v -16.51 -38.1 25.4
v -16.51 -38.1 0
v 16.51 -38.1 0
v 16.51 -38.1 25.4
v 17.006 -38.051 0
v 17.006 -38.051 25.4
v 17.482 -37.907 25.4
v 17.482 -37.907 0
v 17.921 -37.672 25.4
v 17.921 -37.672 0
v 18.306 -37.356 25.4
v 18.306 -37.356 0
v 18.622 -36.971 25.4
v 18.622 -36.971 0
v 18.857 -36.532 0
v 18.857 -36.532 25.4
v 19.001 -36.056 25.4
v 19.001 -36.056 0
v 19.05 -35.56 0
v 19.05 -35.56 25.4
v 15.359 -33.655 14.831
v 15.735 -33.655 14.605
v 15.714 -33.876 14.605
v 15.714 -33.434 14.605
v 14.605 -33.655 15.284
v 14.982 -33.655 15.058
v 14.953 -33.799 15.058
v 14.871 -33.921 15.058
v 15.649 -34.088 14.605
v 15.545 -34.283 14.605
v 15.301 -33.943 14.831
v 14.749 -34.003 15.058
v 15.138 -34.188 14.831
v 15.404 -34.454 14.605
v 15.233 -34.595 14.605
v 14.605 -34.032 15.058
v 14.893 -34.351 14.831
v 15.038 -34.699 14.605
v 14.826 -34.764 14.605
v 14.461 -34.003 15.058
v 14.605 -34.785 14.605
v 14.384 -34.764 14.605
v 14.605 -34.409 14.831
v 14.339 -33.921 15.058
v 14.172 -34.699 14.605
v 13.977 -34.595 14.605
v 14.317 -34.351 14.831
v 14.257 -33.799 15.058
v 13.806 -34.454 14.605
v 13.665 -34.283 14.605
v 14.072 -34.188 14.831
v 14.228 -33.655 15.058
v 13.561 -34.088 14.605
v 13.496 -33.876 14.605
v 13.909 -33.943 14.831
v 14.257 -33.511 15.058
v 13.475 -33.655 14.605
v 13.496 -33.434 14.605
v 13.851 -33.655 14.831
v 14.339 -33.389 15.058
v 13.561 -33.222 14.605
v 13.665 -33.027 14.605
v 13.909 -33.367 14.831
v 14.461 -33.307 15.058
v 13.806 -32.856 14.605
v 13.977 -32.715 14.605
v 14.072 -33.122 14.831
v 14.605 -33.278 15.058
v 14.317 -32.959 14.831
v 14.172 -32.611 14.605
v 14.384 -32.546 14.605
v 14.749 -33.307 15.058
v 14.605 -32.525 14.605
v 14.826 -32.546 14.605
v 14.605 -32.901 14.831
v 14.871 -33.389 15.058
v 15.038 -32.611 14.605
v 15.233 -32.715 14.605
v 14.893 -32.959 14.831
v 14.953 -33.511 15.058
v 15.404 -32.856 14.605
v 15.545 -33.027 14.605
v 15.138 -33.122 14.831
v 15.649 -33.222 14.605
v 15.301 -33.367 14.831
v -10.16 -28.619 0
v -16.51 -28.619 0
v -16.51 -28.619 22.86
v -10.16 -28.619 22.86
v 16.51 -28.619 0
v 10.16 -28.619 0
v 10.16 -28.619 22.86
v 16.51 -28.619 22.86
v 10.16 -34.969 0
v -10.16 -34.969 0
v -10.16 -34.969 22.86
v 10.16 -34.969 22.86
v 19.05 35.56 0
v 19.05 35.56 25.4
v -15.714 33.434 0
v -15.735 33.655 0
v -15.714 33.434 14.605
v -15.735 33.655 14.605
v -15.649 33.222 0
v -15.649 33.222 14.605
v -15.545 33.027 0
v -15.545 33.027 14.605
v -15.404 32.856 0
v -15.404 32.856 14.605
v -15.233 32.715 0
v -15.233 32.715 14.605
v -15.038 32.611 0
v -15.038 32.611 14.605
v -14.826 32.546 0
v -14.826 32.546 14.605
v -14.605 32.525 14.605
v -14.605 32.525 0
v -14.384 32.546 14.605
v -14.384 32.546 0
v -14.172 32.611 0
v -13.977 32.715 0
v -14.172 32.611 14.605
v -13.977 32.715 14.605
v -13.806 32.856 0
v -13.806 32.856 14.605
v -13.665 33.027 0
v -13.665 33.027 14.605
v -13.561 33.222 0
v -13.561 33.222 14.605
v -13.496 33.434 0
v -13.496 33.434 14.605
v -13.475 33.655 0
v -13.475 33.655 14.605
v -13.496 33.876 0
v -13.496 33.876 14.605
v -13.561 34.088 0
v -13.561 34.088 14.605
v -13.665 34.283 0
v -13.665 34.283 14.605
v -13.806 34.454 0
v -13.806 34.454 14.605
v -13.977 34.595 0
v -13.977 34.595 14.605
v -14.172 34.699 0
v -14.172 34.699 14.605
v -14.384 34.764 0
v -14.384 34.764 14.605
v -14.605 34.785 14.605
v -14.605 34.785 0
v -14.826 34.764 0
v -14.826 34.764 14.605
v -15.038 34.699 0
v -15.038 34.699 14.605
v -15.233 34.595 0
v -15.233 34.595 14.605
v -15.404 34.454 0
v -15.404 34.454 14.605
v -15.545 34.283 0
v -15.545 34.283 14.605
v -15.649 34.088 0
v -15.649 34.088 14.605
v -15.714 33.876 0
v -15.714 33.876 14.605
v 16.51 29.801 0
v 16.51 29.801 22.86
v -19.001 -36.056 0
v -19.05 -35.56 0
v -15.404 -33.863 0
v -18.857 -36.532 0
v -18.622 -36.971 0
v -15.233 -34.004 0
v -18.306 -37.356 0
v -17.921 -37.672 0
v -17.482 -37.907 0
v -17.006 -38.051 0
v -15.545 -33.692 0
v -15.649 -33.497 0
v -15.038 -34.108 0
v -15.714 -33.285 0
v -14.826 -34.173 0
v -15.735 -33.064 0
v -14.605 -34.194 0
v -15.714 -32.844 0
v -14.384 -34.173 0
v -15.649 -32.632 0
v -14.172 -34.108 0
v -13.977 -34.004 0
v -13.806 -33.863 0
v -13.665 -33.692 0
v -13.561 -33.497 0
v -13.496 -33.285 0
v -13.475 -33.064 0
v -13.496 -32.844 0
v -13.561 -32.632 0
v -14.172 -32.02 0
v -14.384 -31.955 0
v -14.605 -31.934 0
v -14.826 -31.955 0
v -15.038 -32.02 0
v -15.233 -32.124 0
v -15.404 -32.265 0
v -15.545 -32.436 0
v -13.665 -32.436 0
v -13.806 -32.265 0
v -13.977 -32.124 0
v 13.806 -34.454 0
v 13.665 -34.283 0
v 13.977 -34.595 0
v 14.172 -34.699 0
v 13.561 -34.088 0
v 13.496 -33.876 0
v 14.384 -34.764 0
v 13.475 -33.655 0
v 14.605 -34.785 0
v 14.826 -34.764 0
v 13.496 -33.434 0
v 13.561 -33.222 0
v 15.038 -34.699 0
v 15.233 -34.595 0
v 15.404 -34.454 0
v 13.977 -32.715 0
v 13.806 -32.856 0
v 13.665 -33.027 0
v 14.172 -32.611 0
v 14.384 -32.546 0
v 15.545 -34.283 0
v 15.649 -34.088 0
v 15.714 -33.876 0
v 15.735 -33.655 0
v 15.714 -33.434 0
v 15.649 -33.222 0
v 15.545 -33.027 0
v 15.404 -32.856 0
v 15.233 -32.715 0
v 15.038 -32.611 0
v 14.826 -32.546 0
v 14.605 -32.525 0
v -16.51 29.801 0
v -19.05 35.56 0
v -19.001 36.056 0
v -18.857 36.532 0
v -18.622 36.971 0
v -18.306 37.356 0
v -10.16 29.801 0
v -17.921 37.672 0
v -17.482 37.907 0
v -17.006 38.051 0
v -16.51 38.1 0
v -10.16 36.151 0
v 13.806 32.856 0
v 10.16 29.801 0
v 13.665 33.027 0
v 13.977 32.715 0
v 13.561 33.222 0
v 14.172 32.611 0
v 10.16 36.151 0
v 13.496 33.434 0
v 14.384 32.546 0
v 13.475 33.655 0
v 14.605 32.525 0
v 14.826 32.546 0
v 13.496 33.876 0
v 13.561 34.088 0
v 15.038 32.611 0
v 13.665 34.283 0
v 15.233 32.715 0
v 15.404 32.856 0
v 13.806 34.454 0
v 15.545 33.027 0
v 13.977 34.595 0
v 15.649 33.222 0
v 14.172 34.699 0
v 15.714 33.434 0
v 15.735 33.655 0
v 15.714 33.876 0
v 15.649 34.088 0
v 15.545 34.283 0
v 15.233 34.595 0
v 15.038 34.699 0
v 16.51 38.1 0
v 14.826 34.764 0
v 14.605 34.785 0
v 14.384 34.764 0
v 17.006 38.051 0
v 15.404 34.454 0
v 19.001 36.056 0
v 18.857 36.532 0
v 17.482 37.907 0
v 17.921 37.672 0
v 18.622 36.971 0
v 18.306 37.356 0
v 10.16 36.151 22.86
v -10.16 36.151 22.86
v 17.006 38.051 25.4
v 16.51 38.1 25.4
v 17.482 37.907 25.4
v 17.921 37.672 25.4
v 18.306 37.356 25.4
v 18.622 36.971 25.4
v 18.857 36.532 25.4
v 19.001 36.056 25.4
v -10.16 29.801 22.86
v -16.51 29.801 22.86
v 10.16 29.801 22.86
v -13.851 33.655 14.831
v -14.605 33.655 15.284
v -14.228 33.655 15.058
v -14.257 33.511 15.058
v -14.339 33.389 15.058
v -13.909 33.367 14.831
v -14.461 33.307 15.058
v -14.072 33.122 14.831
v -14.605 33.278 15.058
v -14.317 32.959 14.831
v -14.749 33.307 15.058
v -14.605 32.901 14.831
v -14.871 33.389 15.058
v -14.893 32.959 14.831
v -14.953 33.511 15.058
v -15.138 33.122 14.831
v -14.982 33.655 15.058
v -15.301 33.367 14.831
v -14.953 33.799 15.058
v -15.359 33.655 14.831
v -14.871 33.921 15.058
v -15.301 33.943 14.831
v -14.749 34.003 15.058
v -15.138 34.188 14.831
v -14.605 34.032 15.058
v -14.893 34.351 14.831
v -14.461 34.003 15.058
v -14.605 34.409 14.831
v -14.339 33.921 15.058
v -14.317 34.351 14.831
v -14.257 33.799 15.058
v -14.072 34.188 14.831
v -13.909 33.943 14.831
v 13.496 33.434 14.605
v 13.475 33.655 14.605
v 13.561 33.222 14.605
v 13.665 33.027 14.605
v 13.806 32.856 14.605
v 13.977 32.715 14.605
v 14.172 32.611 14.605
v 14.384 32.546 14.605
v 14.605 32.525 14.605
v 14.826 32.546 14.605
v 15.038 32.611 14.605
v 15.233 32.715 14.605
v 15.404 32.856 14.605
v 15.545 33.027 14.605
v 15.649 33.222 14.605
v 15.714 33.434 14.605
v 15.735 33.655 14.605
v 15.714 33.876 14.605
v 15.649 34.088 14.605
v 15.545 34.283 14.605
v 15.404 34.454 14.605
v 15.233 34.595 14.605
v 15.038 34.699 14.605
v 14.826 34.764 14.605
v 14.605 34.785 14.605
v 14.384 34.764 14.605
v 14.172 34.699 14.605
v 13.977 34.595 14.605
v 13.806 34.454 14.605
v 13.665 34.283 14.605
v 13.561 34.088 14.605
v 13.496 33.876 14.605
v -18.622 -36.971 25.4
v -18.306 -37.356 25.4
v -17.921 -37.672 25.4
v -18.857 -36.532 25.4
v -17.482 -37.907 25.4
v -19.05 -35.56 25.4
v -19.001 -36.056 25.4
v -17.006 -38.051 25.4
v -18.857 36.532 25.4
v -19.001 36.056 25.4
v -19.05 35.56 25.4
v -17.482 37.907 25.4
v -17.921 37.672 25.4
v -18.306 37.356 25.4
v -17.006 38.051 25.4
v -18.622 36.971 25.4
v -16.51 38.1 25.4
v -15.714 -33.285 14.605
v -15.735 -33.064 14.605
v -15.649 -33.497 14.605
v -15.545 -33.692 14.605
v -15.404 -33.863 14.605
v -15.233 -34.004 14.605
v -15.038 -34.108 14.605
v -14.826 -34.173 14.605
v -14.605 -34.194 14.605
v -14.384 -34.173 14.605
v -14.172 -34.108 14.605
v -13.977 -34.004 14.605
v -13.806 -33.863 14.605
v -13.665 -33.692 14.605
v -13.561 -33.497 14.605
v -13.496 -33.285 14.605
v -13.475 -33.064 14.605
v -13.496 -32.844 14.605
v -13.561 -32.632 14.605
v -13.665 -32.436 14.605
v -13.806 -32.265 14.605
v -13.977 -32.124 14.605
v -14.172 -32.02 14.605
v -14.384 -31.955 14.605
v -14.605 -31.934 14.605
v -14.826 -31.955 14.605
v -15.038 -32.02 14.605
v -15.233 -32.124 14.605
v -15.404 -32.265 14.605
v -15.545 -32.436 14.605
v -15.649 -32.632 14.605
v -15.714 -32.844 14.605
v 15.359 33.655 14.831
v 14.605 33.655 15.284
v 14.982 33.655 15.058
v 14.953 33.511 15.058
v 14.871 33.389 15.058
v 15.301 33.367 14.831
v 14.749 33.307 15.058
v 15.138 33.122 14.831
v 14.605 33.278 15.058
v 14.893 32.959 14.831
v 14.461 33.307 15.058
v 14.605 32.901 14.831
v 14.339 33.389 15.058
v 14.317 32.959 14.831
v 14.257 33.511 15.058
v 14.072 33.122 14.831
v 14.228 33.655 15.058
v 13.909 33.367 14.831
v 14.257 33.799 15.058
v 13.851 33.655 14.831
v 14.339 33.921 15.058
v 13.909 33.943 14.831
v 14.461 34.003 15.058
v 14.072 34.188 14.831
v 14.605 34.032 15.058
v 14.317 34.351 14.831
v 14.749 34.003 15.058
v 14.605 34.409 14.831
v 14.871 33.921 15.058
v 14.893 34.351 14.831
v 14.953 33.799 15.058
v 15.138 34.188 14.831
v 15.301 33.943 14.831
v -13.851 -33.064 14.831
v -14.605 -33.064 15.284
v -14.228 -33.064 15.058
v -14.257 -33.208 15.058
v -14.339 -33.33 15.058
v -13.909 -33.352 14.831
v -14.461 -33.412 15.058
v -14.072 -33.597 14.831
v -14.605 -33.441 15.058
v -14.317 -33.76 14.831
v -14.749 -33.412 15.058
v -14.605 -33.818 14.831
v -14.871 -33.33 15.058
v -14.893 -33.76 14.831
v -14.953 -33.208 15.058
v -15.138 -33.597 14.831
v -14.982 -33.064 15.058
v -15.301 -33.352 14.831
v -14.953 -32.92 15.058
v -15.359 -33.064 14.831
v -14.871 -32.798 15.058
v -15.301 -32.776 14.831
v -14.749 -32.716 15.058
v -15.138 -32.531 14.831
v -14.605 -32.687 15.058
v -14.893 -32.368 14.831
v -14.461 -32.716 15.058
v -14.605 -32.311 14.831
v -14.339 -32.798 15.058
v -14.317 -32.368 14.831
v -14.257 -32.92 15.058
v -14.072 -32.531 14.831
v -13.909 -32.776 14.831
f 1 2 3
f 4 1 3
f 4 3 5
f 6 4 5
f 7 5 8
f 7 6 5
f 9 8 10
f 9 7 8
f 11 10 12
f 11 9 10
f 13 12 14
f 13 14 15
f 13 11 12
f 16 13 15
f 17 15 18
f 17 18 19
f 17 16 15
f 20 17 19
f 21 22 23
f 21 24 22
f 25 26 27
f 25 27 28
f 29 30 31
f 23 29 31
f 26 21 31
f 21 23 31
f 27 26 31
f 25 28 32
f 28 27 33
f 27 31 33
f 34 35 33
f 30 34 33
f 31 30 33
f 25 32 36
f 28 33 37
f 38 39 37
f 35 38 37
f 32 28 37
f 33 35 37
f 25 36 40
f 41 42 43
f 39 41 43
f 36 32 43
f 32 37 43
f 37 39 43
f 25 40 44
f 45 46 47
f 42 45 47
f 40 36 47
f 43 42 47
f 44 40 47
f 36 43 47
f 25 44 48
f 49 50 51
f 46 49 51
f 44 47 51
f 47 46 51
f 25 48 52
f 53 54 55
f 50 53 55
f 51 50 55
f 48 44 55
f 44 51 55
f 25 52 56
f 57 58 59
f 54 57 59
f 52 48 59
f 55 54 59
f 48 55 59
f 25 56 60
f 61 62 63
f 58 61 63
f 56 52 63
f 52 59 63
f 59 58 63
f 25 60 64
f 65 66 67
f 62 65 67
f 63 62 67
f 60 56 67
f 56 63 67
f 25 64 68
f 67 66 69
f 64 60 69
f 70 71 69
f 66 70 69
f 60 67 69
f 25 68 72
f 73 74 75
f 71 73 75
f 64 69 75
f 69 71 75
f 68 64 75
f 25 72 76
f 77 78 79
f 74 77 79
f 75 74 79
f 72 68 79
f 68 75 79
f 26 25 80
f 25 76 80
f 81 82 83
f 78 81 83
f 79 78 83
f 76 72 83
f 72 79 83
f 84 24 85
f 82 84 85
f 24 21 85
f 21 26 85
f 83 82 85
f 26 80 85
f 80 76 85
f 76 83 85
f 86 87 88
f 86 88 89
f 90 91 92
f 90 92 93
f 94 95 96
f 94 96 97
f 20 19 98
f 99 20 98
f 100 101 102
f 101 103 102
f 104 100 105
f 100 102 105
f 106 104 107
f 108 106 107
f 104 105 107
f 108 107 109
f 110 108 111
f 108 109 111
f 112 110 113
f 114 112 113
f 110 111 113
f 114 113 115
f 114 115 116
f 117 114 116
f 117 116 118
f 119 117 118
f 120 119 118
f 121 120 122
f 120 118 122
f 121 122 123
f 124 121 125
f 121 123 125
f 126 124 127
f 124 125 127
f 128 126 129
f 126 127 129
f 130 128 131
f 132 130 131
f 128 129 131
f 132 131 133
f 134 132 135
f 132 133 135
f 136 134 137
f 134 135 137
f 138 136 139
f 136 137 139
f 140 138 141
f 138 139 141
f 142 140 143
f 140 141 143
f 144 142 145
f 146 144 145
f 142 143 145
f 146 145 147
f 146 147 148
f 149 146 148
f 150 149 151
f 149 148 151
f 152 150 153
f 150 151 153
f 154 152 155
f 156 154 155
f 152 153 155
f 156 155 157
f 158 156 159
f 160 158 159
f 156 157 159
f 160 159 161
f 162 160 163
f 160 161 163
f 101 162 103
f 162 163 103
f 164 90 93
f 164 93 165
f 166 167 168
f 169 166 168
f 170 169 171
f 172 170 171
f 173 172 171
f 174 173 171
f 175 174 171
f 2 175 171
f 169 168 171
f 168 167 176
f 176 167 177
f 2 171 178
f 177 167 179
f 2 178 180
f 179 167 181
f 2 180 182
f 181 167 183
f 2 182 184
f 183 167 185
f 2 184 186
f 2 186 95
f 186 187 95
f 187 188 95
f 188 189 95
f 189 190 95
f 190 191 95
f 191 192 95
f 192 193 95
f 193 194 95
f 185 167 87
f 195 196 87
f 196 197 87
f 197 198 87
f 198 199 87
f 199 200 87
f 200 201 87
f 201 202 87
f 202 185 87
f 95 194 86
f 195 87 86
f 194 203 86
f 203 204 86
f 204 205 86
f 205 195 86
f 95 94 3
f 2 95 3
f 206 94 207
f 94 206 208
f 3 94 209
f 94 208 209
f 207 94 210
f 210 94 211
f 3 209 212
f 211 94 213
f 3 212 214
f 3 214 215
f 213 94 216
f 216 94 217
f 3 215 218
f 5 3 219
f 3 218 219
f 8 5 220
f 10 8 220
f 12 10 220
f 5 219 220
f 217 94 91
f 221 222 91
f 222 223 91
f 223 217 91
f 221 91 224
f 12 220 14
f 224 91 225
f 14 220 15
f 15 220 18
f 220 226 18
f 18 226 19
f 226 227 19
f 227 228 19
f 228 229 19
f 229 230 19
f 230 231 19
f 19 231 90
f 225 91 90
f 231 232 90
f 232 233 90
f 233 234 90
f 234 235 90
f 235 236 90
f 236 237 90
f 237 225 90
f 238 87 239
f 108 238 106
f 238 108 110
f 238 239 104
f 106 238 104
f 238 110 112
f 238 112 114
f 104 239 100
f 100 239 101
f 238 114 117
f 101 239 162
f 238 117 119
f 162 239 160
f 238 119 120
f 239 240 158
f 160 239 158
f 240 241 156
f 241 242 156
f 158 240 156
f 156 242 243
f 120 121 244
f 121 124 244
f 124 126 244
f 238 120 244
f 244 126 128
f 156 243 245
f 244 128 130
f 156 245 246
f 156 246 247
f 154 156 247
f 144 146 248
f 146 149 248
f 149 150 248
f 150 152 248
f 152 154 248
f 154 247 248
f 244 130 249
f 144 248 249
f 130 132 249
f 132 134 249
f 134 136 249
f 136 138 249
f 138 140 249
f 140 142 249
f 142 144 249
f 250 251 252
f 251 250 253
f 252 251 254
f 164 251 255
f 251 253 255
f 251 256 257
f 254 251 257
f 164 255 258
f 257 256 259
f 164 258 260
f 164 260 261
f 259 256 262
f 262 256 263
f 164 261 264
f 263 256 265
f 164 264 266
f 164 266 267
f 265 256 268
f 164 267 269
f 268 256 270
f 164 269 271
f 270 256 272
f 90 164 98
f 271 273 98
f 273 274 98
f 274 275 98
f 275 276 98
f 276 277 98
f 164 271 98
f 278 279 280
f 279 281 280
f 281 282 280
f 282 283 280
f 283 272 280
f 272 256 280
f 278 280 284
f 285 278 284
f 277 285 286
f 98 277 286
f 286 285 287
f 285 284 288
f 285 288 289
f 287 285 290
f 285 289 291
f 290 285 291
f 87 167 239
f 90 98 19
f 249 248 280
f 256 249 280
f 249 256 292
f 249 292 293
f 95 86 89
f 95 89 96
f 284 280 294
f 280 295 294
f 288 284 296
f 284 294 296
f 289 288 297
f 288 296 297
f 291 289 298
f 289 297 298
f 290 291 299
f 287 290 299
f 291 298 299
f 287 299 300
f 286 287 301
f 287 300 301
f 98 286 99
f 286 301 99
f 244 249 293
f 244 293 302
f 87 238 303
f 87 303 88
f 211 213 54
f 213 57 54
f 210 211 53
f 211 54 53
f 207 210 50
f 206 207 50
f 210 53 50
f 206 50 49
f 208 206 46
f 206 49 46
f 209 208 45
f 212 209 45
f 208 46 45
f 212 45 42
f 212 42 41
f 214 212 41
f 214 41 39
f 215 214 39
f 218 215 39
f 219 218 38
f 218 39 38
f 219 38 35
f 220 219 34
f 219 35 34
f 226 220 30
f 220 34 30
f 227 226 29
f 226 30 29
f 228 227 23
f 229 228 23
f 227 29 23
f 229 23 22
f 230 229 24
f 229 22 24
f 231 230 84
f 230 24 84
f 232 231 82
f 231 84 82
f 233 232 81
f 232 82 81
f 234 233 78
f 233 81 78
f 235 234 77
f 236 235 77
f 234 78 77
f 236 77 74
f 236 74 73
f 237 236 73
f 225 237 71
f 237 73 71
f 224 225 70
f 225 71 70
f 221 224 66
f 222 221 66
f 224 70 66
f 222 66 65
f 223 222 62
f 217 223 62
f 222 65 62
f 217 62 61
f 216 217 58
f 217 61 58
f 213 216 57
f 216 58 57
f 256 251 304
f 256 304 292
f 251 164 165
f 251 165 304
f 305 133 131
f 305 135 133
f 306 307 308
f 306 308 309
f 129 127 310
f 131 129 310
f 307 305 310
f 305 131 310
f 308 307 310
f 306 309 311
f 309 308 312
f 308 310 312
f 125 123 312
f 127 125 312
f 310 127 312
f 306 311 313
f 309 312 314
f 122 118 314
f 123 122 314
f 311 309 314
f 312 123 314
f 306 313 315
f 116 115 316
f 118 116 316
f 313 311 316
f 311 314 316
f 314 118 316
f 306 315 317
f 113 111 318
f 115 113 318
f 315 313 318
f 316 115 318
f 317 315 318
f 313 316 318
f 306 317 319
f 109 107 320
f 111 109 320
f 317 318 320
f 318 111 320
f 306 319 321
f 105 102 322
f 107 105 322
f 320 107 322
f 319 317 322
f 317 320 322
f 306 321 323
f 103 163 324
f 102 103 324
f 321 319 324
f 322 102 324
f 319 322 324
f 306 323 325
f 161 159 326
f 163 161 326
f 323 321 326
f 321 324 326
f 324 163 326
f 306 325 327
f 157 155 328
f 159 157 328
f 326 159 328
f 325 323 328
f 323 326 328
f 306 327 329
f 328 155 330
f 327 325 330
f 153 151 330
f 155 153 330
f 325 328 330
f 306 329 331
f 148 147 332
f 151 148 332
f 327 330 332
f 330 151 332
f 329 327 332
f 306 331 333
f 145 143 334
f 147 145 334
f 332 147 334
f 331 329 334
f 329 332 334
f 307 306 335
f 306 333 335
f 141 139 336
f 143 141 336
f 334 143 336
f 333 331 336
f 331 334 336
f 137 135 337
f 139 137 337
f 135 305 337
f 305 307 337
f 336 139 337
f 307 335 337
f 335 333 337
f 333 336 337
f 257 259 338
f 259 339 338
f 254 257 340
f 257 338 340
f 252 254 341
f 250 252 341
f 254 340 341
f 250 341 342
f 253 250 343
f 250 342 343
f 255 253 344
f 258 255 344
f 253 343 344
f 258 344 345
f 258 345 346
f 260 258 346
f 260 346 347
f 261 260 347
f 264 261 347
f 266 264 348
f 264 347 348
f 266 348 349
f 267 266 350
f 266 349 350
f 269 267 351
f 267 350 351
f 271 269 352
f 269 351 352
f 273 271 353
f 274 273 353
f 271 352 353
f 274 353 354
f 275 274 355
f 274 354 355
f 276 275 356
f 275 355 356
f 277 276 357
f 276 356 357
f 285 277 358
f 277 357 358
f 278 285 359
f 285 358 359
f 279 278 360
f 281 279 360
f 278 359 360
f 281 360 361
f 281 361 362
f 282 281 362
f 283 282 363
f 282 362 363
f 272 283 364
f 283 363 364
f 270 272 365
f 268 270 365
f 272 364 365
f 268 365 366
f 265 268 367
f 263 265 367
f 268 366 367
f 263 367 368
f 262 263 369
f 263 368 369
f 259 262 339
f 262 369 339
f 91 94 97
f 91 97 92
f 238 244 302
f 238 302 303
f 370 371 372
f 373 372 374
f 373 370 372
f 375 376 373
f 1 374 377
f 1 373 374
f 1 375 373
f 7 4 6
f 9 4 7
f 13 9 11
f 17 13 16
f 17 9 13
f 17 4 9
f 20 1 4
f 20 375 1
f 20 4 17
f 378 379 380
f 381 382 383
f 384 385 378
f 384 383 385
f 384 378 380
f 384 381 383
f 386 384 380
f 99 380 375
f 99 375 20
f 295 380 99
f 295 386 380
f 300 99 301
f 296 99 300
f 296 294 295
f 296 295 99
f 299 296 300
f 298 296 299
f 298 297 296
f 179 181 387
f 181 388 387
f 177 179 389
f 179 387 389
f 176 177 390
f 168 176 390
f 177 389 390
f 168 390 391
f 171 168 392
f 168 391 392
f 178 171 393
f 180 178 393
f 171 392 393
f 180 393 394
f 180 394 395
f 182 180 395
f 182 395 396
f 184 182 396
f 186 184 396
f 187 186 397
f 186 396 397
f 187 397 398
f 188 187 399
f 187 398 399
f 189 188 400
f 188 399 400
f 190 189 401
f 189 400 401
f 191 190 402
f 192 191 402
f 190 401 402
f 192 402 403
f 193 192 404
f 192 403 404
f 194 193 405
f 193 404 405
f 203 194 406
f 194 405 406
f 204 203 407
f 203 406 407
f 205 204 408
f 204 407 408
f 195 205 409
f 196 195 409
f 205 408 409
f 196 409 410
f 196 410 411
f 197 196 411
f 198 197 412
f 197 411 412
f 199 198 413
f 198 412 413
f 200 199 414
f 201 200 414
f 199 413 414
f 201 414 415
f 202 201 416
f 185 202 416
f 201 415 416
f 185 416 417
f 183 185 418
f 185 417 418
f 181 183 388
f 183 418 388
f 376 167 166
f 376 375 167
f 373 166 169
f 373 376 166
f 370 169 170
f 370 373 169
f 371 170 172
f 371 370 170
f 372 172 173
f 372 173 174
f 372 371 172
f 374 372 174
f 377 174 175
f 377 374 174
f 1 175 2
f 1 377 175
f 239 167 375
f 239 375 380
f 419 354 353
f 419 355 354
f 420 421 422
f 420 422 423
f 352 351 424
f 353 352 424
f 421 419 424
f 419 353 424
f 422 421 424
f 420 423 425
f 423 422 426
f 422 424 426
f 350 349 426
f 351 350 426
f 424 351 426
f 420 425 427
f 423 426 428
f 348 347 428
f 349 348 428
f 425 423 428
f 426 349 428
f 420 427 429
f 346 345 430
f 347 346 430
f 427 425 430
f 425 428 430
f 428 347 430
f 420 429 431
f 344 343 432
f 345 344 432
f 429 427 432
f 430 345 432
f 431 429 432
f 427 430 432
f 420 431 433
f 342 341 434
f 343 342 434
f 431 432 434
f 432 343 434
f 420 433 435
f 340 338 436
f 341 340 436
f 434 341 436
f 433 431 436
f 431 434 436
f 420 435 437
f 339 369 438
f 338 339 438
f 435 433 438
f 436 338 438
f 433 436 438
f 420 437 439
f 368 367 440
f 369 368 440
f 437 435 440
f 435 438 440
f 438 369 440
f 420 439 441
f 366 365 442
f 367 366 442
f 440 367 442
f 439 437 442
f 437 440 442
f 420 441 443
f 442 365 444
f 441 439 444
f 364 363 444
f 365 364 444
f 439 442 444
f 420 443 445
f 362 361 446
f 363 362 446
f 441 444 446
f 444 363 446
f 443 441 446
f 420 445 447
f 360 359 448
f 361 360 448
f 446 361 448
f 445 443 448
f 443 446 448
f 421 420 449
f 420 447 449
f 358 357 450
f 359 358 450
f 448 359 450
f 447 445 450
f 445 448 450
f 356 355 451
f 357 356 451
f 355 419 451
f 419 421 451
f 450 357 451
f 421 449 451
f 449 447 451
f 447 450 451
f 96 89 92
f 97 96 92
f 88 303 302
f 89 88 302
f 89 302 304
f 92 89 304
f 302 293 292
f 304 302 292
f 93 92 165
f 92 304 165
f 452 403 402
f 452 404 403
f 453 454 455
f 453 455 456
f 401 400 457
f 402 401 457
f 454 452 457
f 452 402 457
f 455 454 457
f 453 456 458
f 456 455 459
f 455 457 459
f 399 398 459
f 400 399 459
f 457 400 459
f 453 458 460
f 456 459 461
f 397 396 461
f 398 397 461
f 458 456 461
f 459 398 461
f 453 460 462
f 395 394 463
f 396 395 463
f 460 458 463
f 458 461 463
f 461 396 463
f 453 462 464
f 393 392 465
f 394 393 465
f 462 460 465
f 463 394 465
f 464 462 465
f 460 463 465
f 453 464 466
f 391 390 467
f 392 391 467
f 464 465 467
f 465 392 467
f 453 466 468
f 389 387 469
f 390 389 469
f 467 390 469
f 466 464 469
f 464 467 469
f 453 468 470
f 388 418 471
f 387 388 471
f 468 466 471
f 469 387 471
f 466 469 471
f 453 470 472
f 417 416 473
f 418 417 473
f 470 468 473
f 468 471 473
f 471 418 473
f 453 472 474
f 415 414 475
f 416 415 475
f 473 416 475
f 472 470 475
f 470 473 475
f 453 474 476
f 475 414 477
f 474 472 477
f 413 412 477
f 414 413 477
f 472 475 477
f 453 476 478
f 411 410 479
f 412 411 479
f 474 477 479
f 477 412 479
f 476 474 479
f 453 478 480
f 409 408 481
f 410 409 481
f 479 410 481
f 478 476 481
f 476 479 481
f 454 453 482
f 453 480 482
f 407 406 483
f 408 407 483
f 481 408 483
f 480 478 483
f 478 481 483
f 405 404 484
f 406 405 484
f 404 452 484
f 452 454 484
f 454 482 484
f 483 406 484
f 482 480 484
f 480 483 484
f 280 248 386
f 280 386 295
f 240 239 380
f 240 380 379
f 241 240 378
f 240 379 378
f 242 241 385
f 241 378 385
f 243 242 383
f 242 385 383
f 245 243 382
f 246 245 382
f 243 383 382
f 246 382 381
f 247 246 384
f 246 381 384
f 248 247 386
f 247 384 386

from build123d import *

# Parameters (mm, degrees)
F0_W     = 38.1
F0_H     = 76.2
F1_DEPTH = 25.4
F3_DEPTH = 22.86
F4_D     = 2.2606
F4_DEPTH = 14.605
F4_TIP   = 0.6791527577
F5_R     = 2.54


with BuildPart() as f1:
    # F0 (on Top) → F1 (new body)
    with BuildSketch(Plane.XY):
        Rectangle(F0_W, F0_H)
    extrude(amount=F1_DEPTH)

    # F2 (on Top) → F3 (cut)
    with BuildSketch(Plane.XY):
        Polygon((10.16, 36.1509363616), (-10.16, 36.1509363616), (-10.16, 29.8009363616), (-16.51, 29.8009363616), (-16.51, -28.6190636384), (-10.16, -28.6190636384), (-10.16, -34.9690636384), (10.16, -34.9690636384), (10.16, -28.6190636384), (16.51, -28.6190636384), (16.51, 29.8009363616), (10.16, 29.8009363616), align=None)
    extrude(amount=F3_DEPTH, mode=Mode.SUBTRACT)

    # F4
    with Locations(Plane(origin=(0, 0, 0), x_dir=(1, 0, 0), z_dir=(0, 0, -1))):
        with Locations((-14.605, -33.655), (14.605, -33.655), (14.605, 33.655), (-14.605, 33.0640636384)):
            Hole(F4_D / 2, depth=F4_DEPTH)
            with Locations((0, 0, -(F4_DEPTH + F4_TIP / 2))):  # 118° drill point
                Cone(0, F4_D / 2, F4_TIP, mode=Mode.SUBTRACT)

    # F5
    f5_edges = [f1.edges().sort_by_distance(p)[0] for p in [
        (19.05, -38.1, 12.7),
        (-19.05, -38.1, 12.7),
        (-19.05, 38.1, 12.7),
        (19.05, 38.1, 12.7),
    ]]
    fillet(f5_edges, radius=F5_R)


solid = f1.part
